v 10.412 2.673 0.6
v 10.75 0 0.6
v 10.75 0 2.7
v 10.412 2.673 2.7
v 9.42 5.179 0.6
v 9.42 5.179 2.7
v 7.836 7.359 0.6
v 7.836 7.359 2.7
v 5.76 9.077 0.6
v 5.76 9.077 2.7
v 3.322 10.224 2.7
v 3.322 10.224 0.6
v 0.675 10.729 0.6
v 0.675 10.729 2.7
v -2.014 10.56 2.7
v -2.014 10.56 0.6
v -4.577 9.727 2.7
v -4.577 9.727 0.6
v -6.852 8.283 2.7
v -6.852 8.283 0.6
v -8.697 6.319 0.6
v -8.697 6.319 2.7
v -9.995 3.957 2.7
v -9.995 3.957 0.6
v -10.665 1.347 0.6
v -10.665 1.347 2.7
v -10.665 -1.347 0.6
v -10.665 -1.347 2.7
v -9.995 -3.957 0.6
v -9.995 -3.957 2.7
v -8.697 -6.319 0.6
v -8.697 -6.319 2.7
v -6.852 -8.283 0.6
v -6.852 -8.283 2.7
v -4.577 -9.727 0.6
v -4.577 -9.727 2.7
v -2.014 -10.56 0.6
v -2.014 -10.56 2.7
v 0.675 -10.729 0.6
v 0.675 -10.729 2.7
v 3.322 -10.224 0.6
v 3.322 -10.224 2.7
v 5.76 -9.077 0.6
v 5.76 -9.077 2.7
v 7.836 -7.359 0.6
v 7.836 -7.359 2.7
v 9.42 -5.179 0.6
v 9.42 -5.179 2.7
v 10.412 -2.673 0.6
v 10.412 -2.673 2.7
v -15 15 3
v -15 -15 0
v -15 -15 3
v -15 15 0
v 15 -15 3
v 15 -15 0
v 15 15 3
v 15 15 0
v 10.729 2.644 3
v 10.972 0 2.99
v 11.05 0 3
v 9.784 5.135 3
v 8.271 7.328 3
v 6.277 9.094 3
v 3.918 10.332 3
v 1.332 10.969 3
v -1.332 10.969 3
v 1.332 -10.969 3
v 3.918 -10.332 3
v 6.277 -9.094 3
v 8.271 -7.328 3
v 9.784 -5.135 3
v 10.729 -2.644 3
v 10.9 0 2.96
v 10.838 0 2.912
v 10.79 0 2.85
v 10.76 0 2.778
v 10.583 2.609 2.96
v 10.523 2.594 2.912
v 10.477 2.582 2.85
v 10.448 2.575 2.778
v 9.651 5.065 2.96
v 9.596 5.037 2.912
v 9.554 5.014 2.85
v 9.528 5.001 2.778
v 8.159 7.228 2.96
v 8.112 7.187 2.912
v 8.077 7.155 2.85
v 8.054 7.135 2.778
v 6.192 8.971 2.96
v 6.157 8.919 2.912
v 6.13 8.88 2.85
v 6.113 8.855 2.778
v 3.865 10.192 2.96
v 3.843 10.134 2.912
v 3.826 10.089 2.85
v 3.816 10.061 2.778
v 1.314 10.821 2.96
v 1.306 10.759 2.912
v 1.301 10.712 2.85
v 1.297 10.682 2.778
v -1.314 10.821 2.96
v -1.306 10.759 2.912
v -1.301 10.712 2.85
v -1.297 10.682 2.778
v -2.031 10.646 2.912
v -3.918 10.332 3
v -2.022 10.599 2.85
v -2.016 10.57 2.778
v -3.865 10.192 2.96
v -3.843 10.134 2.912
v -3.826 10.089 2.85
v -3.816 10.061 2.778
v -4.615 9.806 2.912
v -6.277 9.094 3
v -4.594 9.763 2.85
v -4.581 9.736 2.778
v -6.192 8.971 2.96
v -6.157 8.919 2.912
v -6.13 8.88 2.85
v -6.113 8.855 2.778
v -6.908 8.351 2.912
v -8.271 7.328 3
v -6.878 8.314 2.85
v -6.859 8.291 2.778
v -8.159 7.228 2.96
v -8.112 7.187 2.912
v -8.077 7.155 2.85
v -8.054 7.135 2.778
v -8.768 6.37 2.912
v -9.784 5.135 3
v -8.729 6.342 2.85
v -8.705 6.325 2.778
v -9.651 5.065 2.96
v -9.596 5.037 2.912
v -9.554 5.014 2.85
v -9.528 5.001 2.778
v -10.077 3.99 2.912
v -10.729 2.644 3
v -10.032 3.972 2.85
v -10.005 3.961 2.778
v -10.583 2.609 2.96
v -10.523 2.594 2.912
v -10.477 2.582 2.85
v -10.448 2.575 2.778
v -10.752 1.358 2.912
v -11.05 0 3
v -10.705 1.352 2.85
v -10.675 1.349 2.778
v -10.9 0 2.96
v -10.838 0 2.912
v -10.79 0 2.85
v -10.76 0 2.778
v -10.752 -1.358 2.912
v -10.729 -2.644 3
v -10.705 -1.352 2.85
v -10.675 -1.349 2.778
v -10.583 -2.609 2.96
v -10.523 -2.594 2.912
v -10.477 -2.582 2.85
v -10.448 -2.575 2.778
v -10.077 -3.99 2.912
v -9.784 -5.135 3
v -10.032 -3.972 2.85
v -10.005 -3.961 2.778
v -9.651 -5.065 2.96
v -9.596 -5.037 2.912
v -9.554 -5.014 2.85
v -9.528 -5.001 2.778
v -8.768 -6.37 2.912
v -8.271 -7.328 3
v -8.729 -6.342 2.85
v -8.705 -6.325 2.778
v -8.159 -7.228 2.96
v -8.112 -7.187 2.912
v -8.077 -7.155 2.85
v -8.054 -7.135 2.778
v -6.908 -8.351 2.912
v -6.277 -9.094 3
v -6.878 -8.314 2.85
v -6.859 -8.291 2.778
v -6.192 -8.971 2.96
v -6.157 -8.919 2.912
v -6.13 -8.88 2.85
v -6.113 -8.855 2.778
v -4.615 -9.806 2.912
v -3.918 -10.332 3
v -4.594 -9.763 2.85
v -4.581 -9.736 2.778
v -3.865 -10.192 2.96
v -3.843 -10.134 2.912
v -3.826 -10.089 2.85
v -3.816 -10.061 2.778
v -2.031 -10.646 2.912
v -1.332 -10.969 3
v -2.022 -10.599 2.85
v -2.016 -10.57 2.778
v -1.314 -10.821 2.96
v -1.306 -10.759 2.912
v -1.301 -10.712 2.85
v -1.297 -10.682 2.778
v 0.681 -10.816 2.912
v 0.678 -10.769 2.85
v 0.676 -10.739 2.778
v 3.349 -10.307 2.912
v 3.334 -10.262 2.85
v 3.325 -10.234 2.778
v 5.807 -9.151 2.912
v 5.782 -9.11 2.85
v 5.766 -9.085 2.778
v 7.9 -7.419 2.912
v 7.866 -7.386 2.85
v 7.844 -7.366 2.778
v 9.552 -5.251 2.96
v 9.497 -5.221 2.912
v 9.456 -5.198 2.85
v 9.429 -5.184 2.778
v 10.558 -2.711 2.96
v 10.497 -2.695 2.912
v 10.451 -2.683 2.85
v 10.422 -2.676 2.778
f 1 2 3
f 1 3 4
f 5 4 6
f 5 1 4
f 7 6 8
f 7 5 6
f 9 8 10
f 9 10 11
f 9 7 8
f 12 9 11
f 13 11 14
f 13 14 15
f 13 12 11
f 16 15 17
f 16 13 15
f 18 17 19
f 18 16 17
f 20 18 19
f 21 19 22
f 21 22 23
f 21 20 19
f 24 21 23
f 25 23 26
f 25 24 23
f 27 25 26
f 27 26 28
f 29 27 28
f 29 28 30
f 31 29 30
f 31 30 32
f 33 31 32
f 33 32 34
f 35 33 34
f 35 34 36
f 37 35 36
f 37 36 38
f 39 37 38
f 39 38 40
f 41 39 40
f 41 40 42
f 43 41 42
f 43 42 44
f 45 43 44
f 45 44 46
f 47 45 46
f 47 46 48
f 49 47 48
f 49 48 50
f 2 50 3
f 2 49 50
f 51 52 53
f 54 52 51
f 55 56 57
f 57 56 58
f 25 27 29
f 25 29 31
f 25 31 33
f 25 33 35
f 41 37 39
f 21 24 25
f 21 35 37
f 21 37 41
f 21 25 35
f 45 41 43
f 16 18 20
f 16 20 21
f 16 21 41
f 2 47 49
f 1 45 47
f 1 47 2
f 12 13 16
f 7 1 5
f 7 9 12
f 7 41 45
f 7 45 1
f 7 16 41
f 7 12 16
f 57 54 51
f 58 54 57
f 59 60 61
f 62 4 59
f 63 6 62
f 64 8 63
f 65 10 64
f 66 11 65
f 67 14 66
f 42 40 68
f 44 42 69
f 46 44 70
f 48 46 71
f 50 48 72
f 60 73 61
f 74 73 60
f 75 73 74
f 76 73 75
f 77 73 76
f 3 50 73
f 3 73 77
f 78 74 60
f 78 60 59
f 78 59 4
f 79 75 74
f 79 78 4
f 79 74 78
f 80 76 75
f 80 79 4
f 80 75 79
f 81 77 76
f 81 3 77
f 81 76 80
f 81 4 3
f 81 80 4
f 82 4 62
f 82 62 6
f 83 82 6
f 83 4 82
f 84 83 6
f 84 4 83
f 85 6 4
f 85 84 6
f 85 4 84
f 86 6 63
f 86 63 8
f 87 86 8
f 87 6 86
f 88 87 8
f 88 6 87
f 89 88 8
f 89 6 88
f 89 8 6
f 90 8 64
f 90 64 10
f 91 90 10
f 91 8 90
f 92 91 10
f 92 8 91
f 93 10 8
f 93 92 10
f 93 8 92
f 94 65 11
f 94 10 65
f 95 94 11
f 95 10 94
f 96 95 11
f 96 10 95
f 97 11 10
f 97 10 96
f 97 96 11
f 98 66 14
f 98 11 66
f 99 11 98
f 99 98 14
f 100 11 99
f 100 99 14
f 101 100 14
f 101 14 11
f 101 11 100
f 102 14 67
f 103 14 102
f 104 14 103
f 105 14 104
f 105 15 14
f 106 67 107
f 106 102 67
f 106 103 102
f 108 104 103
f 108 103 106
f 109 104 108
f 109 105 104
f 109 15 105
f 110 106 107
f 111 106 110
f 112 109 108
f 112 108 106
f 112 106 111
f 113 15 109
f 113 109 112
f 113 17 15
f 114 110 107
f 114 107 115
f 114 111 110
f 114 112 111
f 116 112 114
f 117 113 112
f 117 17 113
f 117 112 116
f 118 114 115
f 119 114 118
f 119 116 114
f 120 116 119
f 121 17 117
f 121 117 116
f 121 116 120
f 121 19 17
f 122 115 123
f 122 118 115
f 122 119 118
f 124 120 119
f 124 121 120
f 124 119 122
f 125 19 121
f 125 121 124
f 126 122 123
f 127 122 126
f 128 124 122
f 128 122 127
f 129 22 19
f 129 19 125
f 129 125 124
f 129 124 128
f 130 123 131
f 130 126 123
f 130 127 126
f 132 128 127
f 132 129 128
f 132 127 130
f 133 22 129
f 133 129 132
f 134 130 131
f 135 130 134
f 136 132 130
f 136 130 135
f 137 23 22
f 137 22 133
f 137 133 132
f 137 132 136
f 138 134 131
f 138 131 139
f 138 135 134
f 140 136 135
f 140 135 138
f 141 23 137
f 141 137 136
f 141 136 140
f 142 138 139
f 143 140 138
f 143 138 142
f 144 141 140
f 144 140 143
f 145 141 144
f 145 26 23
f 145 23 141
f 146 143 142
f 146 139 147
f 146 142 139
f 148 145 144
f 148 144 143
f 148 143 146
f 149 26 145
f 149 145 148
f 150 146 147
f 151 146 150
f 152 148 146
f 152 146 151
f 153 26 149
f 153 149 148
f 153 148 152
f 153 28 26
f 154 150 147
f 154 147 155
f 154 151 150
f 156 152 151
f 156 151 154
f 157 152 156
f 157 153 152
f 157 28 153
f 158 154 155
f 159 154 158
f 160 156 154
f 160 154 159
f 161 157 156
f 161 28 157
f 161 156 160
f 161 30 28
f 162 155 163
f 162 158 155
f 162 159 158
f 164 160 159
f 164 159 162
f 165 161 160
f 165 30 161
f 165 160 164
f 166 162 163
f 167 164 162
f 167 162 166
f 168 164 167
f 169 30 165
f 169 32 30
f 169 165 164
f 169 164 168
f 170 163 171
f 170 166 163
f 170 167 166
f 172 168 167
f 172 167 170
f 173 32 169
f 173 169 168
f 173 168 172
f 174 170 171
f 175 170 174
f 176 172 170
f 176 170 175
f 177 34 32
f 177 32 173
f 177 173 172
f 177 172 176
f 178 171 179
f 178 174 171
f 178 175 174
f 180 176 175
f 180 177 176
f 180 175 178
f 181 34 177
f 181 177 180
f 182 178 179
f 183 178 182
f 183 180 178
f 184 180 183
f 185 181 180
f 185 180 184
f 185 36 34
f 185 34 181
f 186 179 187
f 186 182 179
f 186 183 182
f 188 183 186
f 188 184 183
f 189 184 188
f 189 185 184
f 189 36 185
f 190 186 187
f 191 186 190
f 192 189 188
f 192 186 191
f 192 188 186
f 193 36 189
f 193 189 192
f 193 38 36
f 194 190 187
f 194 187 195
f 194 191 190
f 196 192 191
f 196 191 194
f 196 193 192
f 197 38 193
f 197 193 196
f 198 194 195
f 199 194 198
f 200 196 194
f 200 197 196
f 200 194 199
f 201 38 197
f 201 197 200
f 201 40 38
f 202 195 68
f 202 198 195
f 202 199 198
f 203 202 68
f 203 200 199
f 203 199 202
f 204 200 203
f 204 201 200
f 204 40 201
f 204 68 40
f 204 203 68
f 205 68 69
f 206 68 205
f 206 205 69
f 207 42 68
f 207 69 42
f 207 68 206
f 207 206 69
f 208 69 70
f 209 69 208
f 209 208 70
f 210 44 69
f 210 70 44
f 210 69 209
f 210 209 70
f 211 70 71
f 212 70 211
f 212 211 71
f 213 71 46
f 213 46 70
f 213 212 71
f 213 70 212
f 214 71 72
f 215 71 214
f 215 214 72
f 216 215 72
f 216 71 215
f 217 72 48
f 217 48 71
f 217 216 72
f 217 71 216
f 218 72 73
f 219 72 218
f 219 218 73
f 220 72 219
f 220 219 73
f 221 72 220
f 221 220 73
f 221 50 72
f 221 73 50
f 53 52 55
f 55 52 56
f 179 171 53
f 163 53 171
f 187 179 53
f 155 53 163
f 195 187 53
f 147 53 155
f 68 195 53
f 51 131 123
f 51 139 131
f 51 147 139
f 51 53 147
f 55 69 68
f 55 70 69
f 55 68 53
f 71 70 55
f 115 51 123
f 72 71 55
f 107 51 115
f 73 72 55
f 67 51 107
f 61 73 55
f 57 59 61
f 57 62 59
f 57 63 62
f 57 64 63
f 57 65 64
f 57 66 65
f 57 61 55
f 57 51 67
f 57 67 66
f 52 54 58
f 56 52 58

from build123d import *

# Parameters (mm, degrees)
F0_W     = 30
F0_H     = 30
F0_R     = 10.75
F1_DEPTH = 3
F2_DEPTH = 0.6
F3_R     = 0.3


with BuildPart() as f1:
    # F0 (on Top) → F1 (new body)
    with BuildSketch(Plane.XY):
        Rectangle(F0_W, F0_H)
        Circle(F0_R, mode=Mode.SUBTRACT)
    extrude(amount=F1_DEPTH)

    # F0 (on Top) → F2 (join)
    with BuildSketch(Plane.XY):
        Circle(F0_R)
    extrude(amount=F2_DEPTH)

    # F3
    f3_edges = [f1.edges().sort_by_distance(p)[0] for p in [
        (-10.75, 0, 3),
    ]]
    fillet(f3_edges, radius=F3_R)


solid = f1.part
